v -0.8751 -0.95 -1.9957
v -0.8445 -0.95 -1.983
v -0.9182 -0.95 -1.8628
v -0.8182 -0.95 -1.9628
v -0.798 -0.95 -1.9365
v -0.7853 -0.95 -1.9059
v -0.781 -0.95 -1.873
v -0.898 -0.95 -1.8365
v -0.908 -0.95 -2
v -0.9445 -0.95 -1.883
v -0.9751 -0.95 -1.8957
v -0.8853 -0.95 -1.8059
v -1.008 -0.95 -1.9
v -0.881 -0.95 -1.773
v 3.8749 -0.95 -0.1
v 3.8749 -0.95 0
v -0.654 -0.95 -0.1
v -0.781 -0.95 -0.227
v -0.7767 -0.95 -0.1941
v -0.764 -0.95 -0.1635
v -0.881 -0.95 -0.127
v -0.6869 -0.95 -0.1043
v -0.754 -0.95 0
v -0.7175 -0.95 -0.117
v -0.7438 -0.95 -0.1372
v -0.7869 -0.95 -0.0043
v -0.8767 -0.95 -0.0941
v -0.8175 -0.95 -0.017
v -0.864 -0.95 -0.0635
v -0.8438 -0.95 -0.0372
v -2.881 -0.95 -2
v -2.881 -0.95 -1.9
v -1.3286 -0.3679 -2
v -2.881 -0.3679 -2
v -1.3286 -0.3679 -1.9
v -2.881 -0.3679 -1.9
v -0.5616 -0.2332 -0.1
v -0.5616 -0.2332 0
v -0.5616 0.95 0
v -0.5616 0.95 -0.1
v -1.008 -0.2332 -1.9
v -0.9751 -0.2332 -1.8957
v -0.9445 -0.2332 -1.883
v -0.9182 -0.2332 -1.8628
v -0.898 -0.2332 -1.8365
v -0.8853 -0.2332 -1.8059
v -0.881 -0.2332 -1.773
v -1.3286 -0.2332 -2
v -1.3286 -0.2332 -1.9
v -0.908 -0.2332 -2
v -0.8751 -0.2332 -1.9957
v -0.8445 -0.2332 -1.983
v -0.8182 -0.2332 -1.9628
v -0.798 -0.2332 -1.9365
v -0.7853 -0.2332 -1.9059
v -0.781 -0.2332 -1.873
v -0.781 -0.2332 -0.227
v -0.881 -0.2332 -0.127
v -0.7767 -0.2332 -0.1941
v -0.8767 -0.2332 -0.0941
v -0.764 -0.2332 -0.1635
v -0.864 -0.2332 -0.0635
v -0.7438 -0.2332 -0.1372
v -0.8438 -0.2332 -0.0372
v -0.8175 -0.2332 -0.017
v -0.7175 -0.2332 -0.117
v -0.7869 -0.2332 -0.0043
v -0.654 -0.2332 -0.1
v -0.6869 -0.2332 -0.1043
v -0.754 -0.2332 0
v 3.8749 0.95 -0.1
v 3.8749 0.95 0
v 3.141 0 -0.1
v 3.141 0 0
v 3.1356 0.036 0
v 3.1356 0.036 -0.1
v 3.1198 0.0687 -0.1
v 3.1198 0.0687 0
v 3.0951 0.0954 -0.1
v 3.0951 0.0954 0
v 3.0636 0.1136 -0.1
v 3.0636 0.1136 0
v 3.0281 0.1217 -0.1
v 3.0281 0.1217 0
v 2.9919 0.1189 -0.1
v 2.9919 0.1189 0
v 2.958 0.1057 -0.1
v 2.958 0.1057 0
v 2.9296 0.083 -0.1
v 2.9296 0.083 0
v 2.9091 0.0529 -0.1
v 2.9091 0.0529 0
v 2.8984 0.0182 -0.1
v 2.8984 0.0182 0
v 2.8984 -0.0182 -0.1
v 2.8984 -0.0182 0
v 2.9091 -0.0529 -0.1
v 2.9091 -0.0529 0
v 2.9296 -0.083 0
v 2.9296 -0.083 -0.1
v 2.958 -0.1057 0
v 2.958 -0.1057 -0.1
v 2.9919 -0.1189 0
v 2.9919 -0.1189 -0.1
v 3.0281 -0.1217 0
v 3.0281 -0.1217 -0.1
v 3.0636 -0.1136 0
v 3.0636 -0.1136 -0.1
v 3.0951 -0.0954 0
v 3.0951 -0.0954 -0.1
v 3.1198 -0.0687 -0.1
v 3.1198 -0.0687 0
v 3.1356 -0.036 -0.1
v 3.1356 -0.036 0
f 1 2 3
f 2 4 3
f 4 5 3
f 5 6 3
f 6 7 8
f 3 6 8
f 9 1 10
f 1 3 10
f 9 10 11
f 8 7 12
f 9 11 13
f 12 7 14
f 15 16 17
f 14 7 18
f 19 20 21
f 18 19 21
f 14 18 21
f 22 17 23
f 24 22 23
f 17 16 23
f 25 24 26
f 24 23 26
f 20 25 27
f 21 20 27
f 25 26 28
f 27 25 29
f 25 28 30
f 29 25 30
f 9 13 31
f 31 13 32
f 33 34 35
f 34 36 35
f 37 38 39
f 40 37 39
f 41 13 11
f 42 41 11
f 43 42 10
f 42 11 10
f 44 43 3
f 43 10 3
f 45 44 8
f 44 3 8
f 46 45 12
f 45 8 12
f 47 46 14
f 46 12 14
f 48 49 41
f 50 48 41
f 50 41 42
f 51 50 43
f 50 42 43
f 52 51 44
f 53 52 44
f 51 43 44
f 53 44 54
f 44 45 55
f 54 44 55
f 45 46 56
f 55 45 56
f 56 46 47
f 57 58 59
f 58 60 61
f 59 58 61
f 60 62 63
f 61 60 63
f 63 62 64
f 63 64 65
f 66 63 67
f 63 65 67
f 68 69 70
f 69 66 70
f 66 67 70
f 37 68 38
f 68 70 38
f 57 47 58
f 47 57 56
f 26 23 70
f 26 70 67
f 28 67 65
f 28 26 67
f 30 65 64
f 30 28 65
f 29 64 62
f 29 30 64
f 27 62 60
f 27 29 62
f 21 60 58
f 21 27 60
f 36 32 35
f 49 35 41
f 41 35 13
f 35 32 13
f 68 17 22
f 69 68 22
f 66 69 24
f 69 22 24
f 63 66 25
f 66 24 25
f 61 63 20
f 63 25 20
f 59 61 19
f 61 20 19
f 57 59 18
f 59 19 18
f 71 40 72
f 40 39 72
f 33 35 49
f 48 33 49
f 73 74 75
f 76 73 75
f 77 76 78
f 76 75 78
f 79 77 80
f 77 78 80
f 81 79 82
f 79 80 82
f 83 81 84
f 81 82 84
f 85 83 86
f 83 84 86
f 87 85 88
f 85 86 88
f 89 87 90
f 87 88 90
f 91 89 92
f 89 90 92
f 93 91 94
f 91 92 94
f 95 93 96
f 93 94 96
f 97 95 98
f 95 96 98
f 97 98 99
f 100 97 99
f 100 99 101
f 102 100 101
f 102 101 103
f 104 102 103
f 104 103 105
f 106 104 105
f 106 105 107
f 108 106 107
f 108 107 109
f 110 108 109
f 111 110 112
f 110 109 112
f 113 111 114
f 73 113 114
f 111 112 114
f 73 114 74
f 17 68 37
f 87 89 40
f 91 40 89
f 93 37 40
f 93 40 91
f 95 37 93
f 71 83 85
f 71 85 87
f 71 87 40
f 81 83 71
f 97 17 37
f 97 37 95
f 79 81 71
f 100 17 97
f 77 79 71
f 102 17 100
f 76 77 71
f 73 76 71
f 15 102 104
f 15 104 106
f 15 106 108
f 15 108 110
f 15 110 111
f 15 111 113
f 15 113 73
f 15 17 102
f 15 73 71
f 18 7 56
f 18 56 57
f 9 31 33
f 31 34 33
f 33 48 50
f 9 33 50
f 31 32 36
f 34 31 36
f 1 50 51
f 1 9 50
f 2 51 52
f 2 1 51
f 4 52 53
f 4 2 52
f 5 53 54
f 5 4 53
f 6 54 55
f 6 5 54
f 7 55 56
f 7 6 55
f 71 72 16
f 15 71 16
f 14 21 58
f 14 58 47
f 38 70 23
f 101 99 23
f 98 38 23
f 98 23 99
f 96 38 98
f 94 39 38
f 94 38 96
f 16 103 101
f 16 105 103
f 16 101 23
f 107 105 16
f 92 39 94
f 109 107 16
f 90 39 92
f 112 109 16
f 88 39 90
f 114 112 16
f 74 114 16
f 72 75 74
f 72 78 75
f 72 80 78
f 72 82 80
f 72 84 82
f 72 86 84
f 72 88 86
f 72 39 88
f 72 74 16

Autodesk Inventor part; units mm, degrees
ref_plane "YZ Plane" through (0, 0, 0) normal (1, 0, 0) x (0, 1, 0)
ref_plane "XZ Plane" through (0, 0, 0) normal (0, 1, 0) x (-1, 0, 0)
ref_plane "XY Plane" through (0, 0, 0) normal (0, 0, 1) x (1, 0, 0)
sketch "Sketch1" plane through (0, 0, 0) normal (0, 0, 1) x (1, 0, 0)
  circle A0 centre (3.019, 0) radius 2.2393 projected
  line L0 (3.8749, -0.95) -> (-0.5616, -0.95)
  line L1 (-0.5616, -0.2332) -> (-0.5616, 0.95)
  line L2 (-0.5616, 0.95) -> (3.8749, 0.95)
  line L3 (3.8749, 0.95) -> (3.8749, -0.95)
  line L4 (3.019, 0) -> (-3.8164, 0) construction
  line L5 (-0.5616, -0.95) -> (-2.881, -0.95)
  line L6 (-2.881, -0.95) -> (-2.881, -0.3679)
  line L7 (-2.881, -0.3679) -> (-1.3286, -0.3679)
  circle A1 centre (3.019, 0) radius 3.4 projected
  line L8 (-0.5616, -0.95) -> (-1.3286, -0.95)
  line L9 (-1.3286, -0.3679) -> (-1.3286, -0.2332)
  line L10 (-1.3286, -0.2332) -> (-0.5616, -0.2332)
  circle A2 centre (3.019, 0) radius 0.122
  point P0 (0, 0)
  dimension "d0" = 5.9
  dimension "d1" = 6.8
  dimension "d13" = 1.9
  dimension "d14" = 0.95
extrude "Extrusion1" add sketch "Sketch1" against normal blind 2 contours L2 L3 L0 A0 | A0 L0 A1 L2 | A1 L0 L5 L6 L7 L9 L10 L1 L2 picked at (2.6128, -0.6709) picked at (0.0739, 0.5857)
sketch "Sketch2" plane through (-2.881, -0.95, 0) normal (0, -1, 0) x (1, 0, 0)
  line L0 (6.7559, 0) -> (0, 0) projected
  line L1 (0, 0) -> (0, -2) projected
  line L2 (6.7559, -2) -> (0, -2) projected
  line L3 (6.7559, 0) -> (6.7559, -2) projected
  line L4 (0, -1.9) -> (1.873, -1.9)
  line L5 (2.227, -0.1) -> (6.7559, -0.1)
  line L6 (2.1, -1.873) -> (2.1, -0.227)
  line L7 (2, 0) -> (2, -1.773)
  arc A0 (1.873, -1.9) -> (2, -1.773) centre (1.873, -1.773) ccw
  arc A1 (2.227, -0.1) -> (2.1, -0.227) centre (2.227, -0.227) ccw
  line L8 (2.1, -1.9) -> (2.1, -2)
  line L9 (1.973, -2) -> (0, -2)
  line L10 (0, -2) -> (0, -1.9)
  line L11 (2.127, 0) -> (6.7559, 0)
  line L12 (6.7559, 0) -> (6.7559, -0.1)
  line L13 (2, -0.1) -> (2, -0.127)
  arc A2 (2.127, 0) -> (2, -0.127) centre (2.127, -0.127) ccw
  arc A3 (1.973, -2) -> (2.1, -1.873) centre (1.973, -1.873) ccw
  line L14 (6.7559, -0.1) -> (2.227, -0.1)
  line L15 (2.0029, -0.1) -> (2, -0.1)
  line L16 (0, -1.9) -> (1.873, -1.9)
  line L17 (2.0971, -1.9) -> (2.1, -1.9)
  point P0 (2.881, 0)
  point P1 (6.7559, -1.9)
  point P2 (0, -0.1)
  point P3 (2.1, 0)
  point P4 (2, -2)
  dimension "d4" = 0.1
  dimension "d5" = 0.1
  dimension "d6" = 2.1
  dimension "d7" = 0.1
  dimension "d8" = 0.127
  dimension "d9" = 0.127
extrude "Extrusion2" cut sketch "Sketch2" against normal blind 2 contours L3 L5 A1 L6 A3 L2 L1 L4 A0 L7 A2 L0 | A2 L15 L7 L0 keep common part
fillet "Fillet1" radius 0.127 1 edges at (-0.881, -0.5916, 0)
equation "\"d14\" = 0.5 * d13"
properties part number "PosTerm" material "Nickel-Copper Alloy 400"
